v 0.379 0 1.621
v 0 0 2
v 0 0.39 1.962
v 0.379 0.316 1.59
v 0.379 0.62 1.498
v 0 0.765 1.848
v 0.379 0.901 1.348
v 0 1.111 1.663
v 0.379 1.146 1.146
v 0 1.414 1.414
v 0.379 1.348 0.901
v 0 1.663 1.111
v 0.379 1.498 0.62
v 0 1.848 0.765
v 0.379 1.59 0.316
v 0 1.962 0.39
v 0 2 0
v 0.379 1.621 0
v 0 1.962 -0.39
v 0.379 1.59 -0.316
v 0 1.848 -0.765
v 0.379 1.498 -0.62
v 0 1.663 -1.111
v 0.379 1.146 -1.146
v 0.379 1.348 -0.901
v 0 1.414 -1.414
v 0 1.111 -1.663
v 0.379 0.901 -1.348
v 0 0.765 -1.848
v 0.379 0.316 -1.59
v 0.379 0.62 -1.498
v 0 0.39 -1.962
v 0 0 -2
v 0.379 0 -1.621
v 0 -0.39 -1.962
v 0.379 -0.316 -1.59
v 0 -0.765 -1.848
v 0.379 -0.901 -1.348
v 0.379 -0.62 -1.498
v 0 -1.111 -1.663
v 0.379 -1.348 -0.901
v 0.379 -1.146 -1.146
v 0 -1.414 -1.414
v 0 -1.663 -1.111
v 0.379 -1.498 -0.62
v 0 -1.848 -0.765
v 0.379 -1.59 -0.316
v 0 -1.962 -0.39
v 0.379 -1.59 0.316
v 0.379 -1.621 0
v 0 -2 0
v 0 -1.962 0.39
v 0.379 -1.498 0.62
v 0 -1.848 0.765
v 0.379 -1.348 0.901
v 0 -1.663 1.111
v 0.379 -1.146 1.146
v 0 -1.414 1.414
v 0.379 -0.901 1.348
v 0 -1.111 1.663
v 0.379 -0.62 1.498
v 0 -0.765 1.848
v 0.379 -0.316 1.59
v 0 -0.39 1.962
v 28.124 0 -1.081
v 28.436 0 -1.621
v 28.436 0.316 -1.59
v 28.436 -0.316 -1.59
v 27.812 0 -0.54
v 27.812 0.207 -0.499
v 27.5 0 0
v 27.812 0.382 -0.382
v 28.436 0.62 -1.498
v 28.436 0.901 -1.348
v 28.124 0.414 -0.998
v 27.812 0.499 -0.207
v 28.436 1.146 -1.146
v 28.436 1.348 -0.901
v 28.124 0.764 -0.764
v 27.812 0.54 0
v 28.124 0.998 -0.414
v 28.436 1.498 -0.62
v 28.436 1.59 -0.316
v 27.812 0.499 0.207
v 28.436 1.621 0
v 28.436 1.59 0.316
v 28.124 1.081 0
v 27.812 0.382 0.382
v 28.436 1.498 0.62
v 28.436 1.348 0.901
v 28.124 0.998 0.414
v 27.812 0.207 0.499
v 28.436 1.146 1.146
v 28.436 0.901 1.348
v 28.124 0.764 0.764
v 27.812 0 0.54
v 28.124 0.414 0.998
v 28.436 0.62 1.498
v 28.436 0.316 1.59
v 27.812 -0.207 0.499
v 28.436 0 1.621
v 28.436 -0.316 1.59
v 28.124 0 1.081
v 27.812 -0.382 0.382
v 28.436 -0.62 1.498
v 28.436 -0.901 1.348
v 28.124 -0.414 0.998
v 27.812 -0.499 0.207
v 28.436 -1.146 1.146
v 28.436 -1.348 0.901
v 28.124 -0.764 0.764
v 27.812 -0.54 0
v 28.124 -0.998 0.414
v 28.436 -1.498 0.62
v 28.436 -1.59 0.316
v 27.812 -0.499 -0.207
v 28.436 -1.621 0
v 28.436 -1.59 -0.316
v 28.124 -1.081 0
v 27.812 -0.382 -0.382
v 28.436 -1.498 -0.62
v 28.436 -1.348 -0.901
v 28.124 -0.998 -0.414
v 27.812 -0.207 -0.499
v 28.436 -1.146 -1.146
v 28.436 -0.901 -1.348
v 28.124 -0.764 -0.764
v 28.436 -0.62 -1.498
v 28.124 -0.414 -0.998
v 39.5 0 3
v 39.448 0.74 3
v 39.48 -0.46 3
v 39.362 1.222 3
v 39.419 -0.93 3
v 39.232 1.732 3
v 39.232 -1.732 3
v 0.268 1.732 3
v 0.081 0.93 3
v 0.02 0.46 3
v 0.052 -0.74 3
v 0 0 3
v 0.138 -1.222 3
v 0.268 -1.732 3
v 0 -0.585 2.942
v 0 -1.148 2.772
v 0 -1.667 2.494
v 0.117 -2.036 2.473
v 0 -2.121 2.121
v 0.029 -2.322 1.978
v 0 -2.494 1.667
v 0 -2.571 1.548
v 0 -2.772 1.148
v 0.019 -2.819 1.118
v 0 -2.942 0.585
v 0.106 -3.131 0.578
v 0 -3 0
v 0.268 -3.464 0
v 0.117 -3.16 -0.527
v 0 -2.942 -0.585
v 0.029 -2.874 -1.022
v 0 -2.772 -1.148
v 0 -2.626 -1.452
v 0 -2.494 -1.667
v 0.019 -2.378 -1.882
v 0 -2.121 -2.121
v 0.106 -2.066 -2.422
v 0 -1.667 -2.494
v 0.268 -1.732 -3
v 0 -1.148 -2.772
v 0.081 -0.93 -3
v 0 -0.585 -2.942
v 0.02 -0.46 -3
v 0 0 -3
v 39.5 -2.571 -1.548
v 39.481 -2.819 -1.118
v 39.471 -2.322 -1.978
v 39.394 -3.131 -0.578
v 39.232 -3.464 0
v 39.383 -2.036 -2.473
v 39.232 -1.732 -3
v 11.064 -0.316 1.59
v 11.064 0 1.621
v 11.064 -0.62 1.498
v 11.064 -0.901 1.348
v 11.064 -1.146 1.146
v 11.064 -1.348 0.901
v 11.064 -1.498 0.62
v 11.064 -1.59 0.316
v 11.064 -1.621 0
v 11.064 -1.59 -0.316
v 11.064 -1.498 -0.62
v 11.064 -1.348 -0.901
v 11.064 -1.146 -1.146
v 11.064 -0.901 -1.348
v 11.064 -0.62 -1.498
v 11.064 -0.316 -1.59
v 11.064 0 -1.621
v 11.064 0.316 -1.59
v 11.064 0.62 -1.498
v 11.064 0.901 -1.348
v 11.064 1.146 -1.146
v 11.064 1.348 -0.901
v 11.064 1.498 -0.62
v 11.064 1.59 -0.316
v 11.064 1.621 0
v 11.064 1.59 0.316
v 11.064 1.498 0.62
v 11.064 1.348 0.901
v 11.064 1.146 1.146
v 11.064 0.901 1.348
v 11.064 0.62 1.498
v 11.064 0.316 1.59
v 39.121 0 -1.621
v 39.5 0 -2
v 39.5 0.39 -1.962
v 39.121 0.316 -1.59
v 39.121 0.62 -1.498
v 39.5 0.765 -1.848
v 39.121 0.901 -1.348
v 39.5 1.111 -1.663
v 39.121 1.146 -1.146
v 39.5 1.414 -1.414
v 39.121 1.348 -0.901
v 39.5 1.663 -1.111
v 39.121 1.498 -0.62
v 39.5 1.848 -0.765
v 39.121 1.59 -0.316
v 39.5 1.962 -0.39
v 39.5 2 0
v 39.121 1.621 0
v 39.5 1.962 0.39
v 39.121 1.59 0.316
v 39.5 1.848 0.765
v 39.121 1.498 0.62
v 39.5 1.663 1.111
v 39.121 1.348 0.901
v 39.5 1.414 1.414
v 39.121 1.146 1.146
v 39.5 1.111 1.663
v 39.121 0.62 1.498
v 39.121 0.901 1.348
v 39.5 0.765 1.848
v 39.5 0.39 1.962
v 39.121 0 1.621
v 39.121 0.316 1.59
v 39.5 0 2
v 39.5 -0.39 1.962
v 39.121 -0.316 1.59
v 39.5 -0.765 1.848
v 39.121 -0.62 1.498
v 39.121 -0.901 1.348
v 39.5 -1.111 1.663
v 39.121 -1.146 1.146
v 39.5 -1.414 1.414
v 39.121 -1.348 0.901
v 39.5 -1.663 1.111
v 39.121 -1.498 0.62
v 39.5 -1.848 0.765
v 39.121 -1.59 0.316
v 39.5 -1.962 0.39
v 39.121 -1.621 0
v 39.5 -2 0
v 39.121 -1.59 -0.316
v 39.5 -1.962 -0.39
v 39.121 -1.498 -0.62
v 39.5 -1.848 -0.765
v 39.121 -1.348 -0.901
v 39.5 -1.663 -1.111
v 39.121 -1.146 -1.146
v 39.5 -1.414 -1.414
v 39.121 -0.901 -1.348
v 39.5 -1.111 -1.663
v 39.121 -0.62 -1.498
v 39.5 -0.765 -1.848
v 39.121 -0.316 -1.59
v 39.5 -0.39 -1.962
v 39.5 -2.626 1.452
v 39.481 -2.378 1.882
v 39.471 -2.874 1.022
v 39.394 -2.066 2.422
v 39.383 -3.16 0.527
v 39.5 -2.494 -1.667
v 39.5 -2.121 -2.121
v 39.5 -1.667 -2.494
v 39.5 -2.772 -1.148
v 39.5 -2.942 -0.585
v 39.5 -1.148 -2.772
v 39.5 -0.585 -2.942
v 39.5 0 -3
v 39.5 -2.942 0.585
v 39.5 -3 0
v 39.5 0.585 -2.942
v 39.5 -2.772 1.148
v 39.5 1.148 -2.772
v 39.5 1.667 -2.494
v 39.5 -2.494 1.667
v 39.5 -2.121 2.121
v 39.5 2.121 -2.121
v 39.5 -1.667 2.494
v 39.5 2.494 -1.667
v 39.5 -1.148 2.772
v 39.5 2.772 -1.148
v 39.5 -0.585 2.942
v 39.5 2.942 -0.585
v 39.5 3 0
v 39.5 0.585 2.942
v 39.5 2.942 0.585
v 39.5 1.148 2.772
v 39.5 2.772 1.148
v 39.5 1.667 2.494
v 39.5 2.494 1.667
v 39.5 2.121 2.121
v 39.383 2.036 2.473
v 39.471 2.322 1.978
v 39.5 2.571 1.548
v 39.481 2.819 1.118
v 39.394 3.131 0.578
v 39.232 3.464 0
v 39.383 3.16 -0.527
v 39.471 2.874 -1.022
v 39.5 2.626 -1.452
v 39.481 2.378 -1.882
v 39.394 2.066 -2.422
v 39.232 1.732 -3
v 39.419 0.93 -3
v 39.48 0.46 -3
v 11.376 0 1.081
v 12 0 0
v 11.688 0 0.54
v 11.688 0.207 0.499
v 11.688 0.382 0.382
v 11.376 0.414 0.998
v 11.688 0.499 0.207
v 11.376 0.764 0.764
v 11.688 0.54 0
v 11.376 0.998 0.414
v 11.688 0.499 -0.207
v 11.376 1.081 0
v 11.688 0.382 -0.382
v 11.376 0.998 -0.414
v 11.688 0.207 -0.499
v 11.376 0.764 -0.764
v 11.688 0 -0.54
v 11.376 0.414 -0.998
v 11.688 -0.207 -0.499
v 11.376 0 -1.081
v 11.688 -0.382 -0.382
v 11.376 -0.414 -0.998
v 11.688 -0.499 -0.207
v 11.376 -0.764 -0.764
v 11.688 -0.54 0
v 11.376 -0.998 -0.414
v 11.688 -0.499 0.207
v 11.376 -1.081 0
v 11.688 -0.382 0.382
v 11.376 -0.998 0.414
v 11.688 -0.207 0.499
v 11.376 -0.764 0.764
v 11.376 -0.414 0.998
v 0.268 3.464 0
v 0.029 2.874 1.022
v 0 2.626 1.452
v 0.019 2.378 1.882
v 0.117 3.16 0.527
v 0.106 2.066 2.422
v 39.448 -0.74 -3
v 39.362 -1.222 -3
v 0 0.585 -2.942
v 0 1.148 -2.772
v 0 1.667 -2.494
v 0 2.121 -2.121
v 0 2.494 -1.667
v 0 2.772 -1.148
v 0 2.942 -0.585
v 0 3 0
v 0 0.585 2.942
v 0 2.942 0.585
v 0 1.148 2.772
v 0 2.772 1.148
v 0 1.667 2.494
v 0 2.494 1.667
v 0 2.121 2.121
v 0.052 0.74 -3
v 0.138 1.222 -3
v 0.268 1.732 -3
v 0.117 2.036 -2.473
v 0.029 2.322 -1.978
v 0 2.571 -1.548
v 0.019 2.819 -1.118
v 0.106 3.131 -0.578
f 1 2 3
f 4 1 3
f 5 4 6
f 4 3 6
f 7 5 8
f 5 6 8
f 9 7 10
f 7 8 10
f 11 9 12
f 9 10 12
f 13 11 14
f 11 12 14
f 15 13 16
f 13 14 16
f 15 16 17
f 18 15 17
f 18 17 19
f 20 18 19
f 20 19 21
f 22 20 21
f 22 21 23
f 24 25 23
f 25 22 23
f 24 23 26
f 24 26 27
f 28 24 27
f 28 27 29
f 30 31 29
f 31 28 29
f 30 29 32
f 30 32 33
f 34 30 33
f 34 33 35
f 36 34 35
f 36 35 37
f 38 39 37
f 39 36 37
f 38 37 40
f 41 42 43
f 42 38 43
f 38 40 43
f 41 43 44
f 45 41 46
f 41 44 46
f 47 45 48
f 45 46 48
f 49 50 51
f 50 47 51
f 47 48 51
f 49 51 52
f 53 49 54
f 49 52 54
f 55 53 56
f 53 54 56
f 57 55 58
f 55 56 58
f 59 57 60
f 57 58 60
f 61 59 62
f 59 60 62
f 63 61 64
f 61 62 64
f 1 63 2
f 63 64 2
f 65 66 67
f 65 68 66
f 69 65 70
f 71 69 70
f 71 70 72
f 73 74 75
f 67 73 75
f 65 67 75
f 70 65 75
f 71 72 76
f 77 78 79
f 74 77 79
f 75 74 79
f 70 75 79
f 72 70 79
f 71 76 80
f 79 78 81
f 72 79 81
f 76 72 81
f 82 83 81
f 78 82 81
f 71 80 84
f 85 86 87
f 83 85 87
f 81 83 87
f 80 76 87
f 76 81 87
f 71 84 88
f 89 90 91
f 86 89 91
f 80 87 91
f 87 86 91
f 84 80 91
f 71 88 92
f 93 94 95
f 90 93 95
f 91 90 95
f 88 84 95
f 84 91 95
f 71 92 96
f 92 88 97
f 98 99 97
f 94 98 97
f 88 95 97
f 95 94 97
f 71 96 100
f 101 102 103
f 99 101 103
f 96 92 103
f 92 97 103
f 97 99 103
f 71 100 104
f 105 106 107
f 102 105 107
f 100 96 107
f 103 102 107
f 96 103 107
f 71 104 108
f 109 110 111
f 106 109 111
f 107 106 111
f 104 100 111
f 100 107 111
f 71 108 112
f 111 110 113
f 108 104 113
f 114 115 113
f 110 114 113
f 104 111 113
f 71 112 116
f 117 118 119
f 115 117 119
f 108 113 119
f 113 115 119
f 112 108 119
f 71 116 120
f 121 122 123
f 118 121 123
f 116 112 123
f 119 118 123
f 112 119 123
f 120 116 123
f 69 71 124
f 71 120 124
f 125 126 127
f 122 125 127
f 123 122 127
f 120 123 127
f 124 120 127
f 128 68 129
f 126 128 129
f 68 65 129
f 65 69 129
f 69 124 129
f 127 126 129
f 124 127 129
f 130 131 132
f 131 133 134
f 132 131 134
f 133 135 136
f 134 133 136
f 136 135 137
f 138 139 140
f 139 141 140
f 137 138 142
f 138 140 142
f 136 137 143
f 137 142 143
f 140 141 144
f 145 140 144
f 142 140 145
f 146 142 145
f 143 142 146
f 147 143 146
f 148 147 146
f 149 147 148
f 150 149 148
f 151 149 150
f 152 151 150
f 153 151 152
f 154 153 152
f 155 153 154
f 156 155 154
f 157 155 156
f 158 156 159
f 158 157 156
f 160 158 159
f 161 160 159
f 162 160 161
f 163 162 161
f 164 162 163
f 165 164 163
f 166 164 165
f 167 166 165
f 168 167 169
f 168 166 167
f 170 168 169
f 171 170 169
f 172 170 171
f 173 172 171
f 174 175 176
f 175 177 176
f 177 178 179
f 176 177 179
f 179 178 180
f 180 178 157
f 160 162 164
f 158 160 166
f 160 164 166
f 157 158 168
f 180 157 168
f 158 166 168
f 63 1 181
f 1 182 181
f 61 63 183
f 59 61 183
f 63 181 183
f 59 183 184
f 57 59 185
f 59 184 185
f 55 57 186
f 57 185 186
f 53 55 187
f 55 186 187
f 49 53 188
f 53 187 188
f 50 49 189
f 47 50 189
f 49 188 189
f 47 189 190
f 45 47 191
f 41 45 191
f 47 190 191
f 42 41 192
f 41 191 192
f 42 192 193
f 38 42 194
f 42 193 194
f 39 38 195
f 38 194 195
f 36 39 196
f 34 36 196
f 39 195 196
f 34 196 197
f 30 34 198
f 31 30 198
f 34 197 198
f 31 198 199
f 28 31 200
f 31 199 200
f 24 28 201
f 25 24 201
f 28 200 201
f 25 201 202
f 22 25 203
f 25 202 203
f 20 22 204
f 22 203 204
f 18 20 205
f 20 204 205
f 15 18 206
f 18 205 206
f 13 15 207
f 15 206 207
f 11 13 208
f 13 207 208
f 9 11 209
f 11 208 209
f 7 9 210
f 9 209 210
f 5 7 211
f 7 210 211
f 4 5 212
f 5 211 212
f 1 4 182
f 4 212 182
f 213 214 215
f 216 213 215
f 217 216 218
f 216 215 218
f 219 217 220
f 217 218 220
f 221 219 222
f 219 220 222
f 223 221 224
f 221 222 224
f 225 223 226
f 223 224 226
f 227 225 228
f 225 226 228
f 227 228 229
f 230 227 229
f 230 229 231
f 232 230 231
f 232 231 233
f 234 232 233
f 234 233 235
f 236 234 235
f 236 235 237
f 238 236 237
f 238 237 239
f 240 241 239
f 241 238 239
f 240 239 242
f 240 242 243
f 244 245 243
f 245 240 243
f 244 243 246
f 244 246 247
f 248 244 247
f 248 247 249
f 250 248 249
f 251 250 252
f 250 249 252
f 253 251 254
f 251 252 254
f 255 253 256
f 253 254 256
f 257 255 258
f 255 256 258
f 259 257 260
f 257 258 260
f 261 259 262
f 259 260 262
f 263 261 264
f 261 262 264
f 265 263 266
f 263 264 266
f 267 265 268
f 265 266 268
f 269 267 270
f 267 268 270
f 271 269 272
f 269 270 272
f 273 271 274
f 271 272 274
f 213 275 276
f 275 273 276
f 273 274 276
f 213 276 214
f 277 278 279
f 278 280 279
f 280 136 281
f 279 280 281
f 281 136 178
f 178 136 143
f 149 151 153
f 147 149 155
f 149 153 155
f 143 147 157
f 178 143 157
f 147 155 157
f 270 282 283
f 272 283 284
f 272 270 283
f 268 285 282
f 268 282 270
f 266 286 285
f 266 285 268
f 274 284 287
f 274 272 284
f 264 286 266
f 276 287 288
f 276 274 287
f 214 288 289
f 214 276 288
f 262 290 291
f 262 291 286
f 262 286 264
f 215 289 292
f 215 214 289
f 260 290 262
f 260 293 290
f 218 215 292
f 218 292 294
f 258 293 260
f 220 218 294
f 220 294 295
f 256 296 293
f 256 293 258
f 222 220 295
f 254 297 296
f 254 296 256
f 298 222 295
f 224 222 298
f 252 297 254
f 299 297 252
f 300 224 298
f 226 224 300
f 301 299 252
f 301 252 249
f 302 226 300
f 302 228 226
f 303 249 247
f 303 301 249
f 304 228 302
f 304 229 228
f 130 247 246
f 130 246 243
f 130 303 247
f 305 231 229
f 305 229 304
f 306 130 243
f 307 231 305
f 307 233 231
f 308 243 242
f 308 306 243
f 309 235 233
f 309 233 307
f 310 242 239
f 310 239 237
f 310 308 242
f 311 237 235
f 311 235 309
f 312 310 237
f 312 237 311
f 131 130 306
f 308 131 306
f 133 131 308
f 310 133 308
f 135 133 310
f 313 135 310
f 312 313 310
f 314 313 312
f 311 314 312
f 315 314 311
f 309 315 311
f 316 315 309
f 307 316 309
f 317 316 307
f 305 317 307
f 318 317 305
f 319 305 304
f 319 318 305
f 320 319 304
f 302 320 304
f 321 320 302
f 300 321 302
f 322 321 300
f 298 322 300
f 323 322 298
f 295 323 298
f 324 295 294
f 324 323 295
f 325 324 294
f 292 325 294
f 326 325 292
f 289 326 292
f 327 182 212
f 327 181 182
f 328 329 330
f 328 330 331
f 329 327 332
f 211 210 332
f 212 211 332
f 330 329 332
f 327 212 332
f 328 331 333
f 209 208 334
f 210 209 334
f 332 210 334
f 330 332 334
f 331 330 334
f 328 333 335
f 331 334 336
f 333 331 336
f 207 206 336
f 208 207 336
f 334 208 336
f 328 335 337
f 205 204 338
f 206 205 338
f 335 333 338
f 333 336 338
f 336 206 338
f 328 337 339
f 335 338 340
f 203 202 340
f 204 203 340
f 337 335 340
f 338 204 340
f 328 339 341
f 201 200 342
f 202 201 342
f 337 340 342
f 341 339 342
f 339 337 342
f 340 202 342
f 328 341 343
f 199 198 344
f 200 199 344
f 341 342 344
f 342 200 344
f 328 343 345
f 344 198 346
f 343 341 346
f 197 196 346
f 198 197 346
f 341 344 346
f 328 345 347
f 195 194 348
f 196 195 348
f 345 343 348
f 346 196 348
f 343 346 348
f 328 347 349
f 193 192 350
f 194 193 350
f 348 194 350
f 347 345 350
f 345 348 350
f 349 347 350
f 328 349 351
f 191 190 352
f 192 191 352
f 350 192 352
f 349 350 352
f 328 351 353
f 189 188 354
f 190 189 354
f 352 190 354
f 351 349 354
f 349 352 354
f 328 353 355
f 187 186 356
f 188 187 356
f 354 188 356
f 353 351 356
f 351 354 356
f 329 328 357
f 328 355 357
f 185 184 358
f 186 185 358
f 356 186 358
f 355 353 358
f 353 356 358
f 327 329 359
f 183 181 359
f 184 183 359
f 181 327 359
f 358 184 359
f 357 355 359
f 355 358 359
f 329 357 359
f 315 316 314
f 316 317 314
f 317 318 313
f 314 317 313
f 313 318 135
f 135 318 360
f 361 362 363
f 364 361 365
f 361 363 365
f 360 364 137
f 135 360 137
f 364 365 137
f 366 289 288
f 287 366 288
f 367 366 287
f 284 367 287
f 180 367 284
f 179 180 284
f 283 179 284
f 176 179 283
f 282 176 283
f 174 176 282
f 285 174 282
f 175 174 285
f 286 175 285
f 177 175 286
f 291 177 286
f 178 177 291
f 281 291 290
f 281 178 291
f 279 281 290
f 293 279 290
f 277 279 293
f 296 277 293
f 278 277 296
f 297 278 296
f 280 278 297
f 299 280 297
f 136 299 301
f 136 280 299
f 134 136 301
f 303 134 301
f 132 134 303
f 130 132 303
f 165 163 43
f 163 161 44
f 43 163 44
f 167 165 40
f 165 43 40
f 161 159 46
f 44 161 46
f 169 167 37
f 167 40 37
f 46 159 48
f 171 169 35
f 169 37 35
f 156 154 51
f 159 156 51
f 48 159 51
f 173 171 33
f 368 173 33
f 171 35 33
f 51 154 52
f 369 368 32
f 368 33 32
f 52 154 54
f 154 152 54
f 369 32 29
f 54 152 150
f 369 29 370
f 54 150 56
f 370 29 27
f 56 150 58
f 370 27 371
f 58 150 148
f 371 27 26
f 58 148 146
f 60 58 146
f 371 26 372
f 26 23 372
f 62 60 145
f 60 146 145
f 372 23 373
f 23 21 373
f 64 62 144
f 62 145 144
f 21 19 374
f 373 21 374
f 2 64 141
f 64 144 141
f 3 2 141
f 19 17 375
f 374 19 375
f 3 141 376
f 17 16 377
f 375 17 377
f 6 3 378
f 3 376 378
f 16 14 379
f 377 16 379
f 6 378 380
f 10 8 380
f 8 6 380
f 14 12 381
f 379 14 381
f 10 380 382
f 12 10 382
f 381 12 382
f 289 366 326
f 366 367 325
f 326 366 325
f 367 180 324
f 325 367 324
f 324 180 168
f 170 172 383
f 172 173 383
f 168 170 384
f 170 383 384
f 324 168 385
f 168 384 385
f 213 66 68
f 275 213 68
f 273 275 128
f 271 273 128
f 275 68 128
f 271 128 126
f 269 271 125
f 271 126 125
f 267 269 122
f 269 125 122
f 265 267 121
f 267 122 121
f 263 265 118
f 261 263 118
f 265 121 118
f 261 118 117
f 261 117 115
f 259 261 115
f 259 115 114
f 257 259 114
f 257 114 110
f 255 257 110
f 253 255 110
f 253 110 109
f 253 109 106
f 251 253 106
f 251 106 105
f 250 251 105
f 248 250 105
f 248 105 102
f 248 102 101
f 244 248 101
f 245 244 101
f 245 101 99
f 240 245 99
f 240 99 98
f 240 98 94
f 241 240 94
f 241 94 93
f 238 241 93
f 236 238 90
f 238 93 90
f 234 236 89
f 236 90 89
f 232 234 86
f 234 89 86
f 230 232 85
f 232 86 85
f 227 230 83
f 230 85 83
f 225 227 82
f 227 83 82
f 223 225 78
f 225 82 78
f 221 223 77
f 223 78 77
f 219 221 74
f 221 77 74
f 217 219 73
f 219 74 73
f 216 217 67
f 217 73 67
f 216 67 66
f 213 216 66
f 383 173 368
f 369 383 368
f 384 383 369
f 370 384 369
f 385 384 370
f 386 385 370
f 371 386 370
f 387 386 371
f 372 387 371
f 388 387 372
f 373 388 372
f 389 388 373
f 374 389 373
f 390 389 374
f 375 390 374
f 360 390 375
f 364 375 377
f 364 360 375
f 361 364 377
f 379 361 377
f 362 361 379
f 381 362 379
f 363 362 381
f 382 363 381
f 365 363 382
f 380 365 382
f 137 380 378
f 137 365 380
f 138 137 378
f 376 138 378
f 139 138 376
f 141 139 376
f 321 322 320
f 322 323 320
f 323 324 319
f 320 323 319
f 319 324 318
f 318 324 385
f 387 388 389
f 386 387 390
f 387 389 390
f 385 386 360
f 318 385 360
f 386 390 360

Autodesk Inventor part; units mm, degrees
sketch "Sketch_1" plane through (0, 0, 0) normal (0, 0, 1) x (1, 0, 0)
  line L0 (39.5, 0) -> (0, 0)
  line L1 (0, 0) -> (0, 3)
  line L2 (0, 3) -> (0.5485, 3.95)
  line L3 (0.5485, 3.95) -> (38.9515, 3.95)
  line L4 (38.9515, 3.95) -> (39.5, 3)
  line L5 (39.5, 3) -> (39.5, 0)
  line L6 (39.5, 0) -> (0, 0)
revolve "Revolution1" add sketch "Sketch_1" angle 360 about axis through (39.5, 0, 0) along (1, 0, 0)
sketch "Sketch_2" plane through (0, 0, 0) normal (1, 0, 0) x (0, 1, 0)
  line L0 (6, 6) -> (-6, 6)
  line L1 (-6, 6) -> (-6, -6)
  line L2 (-6, -6) -> (6, -6)
  line L3 (6, -6) -> (6, 6)
  line L4 (-1.7321, 3) -> (-3.4641, 0)
  line L5 (-3.4641, 0) -> (-1.7321, -3)
  line L6 (-1.7321, -3) -> (1.7321, -3)
  line L7 (1.7321, -3) -> (3.4641, 0)
  line L8 (3.4641, 0) -> (1.7321, 3)
  line L9 (1.7321, 3) -> (-1.7321, 3)
extrude "Extrusion1" cut sketch "Sketch_2" along normal blind 39.5
sketch "Sketch3" plane through (0, 0, 0) normal (-1, 0, 0) x (0, 0, 1)
  point P0 (0, 0)
hole "Hole1" at (0, 0, 0) direction (1, 0, 0) diameter 3.242 depth 11.0641 tip angle 120 countersink diameter 4 countersink angle 90 thread size "M4x0.7" class "6H" standard "ISO Metric profile"
sketch "Sketch4" plane through (39.5, 0, 0) normal (1, 0, 0) x (0, 0, -1)
  point P0 (0, 0)
hole "Hole2" at (39.5, 0, 0) direction (-1, 0, 0) diameter 3.242 depth 11.0641 tip angle 120 countersink diameter 4 countersink angle 90 thread size "M4x0.7" class "6H" standard "ISO Metric profile"
ref_plane "C3_XY" through (39.5, 0, 0) normal (-1, 0, 0) x (0, 0, -1)
ref_plane "C3_YZ" through (39.5, 0, 0) normal (0, 0, -1) x (0, -1, 0)
ref_plane "C3_ZX" through (39.5, 0, 0) normal (0, -1, 0) x (-1, 0, 0)
properties part number "SLSBF6-39.5-M4-N4"
